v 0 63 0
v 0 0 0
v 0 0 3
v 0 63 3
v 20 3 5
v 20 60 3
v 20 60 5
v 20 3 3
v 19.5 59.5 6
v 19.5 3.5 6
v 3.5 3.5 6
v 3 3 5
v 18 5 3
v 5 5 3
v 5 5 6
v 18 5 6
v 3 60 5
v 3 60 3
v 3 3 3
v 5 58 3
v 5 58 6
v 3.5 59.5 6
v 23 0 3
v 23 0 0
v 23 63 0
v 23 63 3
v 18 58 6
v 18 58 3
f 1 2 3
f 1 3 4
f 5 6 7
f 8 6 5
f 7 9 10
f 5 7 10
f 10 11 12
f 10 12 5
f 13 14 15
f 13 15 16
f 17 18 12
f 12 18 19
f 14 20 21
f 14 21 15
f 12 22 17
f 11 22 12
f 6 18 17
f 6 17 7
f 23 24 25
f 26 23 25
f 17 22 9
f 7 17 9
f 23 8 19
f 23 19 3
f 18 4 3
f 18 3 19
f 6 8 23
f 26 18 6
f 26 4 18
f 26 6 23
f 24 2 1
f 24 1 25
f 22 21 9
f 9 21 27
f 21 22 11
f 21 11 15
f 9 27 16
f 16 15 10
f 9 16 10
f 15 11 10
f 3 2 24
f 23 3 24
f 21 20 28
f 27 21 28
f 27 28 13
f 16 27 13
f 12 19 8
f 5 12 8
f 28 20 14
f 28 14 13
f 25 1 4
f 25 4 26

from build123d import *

# Parameters (mm, degrees)
F0_W     = 23
F0_H     = 63
F1_DEPTH = 3
F2_W     = 17
F2_H     = 57
F2_W_2   = 13
F2_H_2   = 53
F3_DEPTH = 6
F4_SIZE2 = 0.5
F4_SIZE  = 1


with BuildPart() as f1:
    # F0 (on Top) → F1 (new body)
    with BuildSketch(Plane.XY):
        with Locations((11.5, 31.5)):
            Rectangle(F0_W, F0_H)
    extrude(amount=F1_DEPTH)

    # F2 (on face) → F3 (join)
    with BuildSketch(Plane(origin=(0, 0, 0), x_dir=(1, 0, 0), z_dir=(0, 0, -1))):
        with Locations((11.5, -31.5)):
            Rectangle(F2_W, F2_H)
        with Locations((11.5, -31.5)):
            Rectangle(F2_W_2, F2_H_2, mode=Mode.SUBTRACT)
    extrude(amount=-F3_DEPTH)

    # F4
    f4_edges = [f1.edges().sort_by_distance(p)[0] for p in [
        (11.5, 3, 6),
        (20, 31.5, 6),
        (3, 31.5, 6),
        (11.5, 60, 6),
    ]]
    chamfer(f4_edges, length=F4_SIZE, length2=F4_SIZE2)


solid = f1.part
